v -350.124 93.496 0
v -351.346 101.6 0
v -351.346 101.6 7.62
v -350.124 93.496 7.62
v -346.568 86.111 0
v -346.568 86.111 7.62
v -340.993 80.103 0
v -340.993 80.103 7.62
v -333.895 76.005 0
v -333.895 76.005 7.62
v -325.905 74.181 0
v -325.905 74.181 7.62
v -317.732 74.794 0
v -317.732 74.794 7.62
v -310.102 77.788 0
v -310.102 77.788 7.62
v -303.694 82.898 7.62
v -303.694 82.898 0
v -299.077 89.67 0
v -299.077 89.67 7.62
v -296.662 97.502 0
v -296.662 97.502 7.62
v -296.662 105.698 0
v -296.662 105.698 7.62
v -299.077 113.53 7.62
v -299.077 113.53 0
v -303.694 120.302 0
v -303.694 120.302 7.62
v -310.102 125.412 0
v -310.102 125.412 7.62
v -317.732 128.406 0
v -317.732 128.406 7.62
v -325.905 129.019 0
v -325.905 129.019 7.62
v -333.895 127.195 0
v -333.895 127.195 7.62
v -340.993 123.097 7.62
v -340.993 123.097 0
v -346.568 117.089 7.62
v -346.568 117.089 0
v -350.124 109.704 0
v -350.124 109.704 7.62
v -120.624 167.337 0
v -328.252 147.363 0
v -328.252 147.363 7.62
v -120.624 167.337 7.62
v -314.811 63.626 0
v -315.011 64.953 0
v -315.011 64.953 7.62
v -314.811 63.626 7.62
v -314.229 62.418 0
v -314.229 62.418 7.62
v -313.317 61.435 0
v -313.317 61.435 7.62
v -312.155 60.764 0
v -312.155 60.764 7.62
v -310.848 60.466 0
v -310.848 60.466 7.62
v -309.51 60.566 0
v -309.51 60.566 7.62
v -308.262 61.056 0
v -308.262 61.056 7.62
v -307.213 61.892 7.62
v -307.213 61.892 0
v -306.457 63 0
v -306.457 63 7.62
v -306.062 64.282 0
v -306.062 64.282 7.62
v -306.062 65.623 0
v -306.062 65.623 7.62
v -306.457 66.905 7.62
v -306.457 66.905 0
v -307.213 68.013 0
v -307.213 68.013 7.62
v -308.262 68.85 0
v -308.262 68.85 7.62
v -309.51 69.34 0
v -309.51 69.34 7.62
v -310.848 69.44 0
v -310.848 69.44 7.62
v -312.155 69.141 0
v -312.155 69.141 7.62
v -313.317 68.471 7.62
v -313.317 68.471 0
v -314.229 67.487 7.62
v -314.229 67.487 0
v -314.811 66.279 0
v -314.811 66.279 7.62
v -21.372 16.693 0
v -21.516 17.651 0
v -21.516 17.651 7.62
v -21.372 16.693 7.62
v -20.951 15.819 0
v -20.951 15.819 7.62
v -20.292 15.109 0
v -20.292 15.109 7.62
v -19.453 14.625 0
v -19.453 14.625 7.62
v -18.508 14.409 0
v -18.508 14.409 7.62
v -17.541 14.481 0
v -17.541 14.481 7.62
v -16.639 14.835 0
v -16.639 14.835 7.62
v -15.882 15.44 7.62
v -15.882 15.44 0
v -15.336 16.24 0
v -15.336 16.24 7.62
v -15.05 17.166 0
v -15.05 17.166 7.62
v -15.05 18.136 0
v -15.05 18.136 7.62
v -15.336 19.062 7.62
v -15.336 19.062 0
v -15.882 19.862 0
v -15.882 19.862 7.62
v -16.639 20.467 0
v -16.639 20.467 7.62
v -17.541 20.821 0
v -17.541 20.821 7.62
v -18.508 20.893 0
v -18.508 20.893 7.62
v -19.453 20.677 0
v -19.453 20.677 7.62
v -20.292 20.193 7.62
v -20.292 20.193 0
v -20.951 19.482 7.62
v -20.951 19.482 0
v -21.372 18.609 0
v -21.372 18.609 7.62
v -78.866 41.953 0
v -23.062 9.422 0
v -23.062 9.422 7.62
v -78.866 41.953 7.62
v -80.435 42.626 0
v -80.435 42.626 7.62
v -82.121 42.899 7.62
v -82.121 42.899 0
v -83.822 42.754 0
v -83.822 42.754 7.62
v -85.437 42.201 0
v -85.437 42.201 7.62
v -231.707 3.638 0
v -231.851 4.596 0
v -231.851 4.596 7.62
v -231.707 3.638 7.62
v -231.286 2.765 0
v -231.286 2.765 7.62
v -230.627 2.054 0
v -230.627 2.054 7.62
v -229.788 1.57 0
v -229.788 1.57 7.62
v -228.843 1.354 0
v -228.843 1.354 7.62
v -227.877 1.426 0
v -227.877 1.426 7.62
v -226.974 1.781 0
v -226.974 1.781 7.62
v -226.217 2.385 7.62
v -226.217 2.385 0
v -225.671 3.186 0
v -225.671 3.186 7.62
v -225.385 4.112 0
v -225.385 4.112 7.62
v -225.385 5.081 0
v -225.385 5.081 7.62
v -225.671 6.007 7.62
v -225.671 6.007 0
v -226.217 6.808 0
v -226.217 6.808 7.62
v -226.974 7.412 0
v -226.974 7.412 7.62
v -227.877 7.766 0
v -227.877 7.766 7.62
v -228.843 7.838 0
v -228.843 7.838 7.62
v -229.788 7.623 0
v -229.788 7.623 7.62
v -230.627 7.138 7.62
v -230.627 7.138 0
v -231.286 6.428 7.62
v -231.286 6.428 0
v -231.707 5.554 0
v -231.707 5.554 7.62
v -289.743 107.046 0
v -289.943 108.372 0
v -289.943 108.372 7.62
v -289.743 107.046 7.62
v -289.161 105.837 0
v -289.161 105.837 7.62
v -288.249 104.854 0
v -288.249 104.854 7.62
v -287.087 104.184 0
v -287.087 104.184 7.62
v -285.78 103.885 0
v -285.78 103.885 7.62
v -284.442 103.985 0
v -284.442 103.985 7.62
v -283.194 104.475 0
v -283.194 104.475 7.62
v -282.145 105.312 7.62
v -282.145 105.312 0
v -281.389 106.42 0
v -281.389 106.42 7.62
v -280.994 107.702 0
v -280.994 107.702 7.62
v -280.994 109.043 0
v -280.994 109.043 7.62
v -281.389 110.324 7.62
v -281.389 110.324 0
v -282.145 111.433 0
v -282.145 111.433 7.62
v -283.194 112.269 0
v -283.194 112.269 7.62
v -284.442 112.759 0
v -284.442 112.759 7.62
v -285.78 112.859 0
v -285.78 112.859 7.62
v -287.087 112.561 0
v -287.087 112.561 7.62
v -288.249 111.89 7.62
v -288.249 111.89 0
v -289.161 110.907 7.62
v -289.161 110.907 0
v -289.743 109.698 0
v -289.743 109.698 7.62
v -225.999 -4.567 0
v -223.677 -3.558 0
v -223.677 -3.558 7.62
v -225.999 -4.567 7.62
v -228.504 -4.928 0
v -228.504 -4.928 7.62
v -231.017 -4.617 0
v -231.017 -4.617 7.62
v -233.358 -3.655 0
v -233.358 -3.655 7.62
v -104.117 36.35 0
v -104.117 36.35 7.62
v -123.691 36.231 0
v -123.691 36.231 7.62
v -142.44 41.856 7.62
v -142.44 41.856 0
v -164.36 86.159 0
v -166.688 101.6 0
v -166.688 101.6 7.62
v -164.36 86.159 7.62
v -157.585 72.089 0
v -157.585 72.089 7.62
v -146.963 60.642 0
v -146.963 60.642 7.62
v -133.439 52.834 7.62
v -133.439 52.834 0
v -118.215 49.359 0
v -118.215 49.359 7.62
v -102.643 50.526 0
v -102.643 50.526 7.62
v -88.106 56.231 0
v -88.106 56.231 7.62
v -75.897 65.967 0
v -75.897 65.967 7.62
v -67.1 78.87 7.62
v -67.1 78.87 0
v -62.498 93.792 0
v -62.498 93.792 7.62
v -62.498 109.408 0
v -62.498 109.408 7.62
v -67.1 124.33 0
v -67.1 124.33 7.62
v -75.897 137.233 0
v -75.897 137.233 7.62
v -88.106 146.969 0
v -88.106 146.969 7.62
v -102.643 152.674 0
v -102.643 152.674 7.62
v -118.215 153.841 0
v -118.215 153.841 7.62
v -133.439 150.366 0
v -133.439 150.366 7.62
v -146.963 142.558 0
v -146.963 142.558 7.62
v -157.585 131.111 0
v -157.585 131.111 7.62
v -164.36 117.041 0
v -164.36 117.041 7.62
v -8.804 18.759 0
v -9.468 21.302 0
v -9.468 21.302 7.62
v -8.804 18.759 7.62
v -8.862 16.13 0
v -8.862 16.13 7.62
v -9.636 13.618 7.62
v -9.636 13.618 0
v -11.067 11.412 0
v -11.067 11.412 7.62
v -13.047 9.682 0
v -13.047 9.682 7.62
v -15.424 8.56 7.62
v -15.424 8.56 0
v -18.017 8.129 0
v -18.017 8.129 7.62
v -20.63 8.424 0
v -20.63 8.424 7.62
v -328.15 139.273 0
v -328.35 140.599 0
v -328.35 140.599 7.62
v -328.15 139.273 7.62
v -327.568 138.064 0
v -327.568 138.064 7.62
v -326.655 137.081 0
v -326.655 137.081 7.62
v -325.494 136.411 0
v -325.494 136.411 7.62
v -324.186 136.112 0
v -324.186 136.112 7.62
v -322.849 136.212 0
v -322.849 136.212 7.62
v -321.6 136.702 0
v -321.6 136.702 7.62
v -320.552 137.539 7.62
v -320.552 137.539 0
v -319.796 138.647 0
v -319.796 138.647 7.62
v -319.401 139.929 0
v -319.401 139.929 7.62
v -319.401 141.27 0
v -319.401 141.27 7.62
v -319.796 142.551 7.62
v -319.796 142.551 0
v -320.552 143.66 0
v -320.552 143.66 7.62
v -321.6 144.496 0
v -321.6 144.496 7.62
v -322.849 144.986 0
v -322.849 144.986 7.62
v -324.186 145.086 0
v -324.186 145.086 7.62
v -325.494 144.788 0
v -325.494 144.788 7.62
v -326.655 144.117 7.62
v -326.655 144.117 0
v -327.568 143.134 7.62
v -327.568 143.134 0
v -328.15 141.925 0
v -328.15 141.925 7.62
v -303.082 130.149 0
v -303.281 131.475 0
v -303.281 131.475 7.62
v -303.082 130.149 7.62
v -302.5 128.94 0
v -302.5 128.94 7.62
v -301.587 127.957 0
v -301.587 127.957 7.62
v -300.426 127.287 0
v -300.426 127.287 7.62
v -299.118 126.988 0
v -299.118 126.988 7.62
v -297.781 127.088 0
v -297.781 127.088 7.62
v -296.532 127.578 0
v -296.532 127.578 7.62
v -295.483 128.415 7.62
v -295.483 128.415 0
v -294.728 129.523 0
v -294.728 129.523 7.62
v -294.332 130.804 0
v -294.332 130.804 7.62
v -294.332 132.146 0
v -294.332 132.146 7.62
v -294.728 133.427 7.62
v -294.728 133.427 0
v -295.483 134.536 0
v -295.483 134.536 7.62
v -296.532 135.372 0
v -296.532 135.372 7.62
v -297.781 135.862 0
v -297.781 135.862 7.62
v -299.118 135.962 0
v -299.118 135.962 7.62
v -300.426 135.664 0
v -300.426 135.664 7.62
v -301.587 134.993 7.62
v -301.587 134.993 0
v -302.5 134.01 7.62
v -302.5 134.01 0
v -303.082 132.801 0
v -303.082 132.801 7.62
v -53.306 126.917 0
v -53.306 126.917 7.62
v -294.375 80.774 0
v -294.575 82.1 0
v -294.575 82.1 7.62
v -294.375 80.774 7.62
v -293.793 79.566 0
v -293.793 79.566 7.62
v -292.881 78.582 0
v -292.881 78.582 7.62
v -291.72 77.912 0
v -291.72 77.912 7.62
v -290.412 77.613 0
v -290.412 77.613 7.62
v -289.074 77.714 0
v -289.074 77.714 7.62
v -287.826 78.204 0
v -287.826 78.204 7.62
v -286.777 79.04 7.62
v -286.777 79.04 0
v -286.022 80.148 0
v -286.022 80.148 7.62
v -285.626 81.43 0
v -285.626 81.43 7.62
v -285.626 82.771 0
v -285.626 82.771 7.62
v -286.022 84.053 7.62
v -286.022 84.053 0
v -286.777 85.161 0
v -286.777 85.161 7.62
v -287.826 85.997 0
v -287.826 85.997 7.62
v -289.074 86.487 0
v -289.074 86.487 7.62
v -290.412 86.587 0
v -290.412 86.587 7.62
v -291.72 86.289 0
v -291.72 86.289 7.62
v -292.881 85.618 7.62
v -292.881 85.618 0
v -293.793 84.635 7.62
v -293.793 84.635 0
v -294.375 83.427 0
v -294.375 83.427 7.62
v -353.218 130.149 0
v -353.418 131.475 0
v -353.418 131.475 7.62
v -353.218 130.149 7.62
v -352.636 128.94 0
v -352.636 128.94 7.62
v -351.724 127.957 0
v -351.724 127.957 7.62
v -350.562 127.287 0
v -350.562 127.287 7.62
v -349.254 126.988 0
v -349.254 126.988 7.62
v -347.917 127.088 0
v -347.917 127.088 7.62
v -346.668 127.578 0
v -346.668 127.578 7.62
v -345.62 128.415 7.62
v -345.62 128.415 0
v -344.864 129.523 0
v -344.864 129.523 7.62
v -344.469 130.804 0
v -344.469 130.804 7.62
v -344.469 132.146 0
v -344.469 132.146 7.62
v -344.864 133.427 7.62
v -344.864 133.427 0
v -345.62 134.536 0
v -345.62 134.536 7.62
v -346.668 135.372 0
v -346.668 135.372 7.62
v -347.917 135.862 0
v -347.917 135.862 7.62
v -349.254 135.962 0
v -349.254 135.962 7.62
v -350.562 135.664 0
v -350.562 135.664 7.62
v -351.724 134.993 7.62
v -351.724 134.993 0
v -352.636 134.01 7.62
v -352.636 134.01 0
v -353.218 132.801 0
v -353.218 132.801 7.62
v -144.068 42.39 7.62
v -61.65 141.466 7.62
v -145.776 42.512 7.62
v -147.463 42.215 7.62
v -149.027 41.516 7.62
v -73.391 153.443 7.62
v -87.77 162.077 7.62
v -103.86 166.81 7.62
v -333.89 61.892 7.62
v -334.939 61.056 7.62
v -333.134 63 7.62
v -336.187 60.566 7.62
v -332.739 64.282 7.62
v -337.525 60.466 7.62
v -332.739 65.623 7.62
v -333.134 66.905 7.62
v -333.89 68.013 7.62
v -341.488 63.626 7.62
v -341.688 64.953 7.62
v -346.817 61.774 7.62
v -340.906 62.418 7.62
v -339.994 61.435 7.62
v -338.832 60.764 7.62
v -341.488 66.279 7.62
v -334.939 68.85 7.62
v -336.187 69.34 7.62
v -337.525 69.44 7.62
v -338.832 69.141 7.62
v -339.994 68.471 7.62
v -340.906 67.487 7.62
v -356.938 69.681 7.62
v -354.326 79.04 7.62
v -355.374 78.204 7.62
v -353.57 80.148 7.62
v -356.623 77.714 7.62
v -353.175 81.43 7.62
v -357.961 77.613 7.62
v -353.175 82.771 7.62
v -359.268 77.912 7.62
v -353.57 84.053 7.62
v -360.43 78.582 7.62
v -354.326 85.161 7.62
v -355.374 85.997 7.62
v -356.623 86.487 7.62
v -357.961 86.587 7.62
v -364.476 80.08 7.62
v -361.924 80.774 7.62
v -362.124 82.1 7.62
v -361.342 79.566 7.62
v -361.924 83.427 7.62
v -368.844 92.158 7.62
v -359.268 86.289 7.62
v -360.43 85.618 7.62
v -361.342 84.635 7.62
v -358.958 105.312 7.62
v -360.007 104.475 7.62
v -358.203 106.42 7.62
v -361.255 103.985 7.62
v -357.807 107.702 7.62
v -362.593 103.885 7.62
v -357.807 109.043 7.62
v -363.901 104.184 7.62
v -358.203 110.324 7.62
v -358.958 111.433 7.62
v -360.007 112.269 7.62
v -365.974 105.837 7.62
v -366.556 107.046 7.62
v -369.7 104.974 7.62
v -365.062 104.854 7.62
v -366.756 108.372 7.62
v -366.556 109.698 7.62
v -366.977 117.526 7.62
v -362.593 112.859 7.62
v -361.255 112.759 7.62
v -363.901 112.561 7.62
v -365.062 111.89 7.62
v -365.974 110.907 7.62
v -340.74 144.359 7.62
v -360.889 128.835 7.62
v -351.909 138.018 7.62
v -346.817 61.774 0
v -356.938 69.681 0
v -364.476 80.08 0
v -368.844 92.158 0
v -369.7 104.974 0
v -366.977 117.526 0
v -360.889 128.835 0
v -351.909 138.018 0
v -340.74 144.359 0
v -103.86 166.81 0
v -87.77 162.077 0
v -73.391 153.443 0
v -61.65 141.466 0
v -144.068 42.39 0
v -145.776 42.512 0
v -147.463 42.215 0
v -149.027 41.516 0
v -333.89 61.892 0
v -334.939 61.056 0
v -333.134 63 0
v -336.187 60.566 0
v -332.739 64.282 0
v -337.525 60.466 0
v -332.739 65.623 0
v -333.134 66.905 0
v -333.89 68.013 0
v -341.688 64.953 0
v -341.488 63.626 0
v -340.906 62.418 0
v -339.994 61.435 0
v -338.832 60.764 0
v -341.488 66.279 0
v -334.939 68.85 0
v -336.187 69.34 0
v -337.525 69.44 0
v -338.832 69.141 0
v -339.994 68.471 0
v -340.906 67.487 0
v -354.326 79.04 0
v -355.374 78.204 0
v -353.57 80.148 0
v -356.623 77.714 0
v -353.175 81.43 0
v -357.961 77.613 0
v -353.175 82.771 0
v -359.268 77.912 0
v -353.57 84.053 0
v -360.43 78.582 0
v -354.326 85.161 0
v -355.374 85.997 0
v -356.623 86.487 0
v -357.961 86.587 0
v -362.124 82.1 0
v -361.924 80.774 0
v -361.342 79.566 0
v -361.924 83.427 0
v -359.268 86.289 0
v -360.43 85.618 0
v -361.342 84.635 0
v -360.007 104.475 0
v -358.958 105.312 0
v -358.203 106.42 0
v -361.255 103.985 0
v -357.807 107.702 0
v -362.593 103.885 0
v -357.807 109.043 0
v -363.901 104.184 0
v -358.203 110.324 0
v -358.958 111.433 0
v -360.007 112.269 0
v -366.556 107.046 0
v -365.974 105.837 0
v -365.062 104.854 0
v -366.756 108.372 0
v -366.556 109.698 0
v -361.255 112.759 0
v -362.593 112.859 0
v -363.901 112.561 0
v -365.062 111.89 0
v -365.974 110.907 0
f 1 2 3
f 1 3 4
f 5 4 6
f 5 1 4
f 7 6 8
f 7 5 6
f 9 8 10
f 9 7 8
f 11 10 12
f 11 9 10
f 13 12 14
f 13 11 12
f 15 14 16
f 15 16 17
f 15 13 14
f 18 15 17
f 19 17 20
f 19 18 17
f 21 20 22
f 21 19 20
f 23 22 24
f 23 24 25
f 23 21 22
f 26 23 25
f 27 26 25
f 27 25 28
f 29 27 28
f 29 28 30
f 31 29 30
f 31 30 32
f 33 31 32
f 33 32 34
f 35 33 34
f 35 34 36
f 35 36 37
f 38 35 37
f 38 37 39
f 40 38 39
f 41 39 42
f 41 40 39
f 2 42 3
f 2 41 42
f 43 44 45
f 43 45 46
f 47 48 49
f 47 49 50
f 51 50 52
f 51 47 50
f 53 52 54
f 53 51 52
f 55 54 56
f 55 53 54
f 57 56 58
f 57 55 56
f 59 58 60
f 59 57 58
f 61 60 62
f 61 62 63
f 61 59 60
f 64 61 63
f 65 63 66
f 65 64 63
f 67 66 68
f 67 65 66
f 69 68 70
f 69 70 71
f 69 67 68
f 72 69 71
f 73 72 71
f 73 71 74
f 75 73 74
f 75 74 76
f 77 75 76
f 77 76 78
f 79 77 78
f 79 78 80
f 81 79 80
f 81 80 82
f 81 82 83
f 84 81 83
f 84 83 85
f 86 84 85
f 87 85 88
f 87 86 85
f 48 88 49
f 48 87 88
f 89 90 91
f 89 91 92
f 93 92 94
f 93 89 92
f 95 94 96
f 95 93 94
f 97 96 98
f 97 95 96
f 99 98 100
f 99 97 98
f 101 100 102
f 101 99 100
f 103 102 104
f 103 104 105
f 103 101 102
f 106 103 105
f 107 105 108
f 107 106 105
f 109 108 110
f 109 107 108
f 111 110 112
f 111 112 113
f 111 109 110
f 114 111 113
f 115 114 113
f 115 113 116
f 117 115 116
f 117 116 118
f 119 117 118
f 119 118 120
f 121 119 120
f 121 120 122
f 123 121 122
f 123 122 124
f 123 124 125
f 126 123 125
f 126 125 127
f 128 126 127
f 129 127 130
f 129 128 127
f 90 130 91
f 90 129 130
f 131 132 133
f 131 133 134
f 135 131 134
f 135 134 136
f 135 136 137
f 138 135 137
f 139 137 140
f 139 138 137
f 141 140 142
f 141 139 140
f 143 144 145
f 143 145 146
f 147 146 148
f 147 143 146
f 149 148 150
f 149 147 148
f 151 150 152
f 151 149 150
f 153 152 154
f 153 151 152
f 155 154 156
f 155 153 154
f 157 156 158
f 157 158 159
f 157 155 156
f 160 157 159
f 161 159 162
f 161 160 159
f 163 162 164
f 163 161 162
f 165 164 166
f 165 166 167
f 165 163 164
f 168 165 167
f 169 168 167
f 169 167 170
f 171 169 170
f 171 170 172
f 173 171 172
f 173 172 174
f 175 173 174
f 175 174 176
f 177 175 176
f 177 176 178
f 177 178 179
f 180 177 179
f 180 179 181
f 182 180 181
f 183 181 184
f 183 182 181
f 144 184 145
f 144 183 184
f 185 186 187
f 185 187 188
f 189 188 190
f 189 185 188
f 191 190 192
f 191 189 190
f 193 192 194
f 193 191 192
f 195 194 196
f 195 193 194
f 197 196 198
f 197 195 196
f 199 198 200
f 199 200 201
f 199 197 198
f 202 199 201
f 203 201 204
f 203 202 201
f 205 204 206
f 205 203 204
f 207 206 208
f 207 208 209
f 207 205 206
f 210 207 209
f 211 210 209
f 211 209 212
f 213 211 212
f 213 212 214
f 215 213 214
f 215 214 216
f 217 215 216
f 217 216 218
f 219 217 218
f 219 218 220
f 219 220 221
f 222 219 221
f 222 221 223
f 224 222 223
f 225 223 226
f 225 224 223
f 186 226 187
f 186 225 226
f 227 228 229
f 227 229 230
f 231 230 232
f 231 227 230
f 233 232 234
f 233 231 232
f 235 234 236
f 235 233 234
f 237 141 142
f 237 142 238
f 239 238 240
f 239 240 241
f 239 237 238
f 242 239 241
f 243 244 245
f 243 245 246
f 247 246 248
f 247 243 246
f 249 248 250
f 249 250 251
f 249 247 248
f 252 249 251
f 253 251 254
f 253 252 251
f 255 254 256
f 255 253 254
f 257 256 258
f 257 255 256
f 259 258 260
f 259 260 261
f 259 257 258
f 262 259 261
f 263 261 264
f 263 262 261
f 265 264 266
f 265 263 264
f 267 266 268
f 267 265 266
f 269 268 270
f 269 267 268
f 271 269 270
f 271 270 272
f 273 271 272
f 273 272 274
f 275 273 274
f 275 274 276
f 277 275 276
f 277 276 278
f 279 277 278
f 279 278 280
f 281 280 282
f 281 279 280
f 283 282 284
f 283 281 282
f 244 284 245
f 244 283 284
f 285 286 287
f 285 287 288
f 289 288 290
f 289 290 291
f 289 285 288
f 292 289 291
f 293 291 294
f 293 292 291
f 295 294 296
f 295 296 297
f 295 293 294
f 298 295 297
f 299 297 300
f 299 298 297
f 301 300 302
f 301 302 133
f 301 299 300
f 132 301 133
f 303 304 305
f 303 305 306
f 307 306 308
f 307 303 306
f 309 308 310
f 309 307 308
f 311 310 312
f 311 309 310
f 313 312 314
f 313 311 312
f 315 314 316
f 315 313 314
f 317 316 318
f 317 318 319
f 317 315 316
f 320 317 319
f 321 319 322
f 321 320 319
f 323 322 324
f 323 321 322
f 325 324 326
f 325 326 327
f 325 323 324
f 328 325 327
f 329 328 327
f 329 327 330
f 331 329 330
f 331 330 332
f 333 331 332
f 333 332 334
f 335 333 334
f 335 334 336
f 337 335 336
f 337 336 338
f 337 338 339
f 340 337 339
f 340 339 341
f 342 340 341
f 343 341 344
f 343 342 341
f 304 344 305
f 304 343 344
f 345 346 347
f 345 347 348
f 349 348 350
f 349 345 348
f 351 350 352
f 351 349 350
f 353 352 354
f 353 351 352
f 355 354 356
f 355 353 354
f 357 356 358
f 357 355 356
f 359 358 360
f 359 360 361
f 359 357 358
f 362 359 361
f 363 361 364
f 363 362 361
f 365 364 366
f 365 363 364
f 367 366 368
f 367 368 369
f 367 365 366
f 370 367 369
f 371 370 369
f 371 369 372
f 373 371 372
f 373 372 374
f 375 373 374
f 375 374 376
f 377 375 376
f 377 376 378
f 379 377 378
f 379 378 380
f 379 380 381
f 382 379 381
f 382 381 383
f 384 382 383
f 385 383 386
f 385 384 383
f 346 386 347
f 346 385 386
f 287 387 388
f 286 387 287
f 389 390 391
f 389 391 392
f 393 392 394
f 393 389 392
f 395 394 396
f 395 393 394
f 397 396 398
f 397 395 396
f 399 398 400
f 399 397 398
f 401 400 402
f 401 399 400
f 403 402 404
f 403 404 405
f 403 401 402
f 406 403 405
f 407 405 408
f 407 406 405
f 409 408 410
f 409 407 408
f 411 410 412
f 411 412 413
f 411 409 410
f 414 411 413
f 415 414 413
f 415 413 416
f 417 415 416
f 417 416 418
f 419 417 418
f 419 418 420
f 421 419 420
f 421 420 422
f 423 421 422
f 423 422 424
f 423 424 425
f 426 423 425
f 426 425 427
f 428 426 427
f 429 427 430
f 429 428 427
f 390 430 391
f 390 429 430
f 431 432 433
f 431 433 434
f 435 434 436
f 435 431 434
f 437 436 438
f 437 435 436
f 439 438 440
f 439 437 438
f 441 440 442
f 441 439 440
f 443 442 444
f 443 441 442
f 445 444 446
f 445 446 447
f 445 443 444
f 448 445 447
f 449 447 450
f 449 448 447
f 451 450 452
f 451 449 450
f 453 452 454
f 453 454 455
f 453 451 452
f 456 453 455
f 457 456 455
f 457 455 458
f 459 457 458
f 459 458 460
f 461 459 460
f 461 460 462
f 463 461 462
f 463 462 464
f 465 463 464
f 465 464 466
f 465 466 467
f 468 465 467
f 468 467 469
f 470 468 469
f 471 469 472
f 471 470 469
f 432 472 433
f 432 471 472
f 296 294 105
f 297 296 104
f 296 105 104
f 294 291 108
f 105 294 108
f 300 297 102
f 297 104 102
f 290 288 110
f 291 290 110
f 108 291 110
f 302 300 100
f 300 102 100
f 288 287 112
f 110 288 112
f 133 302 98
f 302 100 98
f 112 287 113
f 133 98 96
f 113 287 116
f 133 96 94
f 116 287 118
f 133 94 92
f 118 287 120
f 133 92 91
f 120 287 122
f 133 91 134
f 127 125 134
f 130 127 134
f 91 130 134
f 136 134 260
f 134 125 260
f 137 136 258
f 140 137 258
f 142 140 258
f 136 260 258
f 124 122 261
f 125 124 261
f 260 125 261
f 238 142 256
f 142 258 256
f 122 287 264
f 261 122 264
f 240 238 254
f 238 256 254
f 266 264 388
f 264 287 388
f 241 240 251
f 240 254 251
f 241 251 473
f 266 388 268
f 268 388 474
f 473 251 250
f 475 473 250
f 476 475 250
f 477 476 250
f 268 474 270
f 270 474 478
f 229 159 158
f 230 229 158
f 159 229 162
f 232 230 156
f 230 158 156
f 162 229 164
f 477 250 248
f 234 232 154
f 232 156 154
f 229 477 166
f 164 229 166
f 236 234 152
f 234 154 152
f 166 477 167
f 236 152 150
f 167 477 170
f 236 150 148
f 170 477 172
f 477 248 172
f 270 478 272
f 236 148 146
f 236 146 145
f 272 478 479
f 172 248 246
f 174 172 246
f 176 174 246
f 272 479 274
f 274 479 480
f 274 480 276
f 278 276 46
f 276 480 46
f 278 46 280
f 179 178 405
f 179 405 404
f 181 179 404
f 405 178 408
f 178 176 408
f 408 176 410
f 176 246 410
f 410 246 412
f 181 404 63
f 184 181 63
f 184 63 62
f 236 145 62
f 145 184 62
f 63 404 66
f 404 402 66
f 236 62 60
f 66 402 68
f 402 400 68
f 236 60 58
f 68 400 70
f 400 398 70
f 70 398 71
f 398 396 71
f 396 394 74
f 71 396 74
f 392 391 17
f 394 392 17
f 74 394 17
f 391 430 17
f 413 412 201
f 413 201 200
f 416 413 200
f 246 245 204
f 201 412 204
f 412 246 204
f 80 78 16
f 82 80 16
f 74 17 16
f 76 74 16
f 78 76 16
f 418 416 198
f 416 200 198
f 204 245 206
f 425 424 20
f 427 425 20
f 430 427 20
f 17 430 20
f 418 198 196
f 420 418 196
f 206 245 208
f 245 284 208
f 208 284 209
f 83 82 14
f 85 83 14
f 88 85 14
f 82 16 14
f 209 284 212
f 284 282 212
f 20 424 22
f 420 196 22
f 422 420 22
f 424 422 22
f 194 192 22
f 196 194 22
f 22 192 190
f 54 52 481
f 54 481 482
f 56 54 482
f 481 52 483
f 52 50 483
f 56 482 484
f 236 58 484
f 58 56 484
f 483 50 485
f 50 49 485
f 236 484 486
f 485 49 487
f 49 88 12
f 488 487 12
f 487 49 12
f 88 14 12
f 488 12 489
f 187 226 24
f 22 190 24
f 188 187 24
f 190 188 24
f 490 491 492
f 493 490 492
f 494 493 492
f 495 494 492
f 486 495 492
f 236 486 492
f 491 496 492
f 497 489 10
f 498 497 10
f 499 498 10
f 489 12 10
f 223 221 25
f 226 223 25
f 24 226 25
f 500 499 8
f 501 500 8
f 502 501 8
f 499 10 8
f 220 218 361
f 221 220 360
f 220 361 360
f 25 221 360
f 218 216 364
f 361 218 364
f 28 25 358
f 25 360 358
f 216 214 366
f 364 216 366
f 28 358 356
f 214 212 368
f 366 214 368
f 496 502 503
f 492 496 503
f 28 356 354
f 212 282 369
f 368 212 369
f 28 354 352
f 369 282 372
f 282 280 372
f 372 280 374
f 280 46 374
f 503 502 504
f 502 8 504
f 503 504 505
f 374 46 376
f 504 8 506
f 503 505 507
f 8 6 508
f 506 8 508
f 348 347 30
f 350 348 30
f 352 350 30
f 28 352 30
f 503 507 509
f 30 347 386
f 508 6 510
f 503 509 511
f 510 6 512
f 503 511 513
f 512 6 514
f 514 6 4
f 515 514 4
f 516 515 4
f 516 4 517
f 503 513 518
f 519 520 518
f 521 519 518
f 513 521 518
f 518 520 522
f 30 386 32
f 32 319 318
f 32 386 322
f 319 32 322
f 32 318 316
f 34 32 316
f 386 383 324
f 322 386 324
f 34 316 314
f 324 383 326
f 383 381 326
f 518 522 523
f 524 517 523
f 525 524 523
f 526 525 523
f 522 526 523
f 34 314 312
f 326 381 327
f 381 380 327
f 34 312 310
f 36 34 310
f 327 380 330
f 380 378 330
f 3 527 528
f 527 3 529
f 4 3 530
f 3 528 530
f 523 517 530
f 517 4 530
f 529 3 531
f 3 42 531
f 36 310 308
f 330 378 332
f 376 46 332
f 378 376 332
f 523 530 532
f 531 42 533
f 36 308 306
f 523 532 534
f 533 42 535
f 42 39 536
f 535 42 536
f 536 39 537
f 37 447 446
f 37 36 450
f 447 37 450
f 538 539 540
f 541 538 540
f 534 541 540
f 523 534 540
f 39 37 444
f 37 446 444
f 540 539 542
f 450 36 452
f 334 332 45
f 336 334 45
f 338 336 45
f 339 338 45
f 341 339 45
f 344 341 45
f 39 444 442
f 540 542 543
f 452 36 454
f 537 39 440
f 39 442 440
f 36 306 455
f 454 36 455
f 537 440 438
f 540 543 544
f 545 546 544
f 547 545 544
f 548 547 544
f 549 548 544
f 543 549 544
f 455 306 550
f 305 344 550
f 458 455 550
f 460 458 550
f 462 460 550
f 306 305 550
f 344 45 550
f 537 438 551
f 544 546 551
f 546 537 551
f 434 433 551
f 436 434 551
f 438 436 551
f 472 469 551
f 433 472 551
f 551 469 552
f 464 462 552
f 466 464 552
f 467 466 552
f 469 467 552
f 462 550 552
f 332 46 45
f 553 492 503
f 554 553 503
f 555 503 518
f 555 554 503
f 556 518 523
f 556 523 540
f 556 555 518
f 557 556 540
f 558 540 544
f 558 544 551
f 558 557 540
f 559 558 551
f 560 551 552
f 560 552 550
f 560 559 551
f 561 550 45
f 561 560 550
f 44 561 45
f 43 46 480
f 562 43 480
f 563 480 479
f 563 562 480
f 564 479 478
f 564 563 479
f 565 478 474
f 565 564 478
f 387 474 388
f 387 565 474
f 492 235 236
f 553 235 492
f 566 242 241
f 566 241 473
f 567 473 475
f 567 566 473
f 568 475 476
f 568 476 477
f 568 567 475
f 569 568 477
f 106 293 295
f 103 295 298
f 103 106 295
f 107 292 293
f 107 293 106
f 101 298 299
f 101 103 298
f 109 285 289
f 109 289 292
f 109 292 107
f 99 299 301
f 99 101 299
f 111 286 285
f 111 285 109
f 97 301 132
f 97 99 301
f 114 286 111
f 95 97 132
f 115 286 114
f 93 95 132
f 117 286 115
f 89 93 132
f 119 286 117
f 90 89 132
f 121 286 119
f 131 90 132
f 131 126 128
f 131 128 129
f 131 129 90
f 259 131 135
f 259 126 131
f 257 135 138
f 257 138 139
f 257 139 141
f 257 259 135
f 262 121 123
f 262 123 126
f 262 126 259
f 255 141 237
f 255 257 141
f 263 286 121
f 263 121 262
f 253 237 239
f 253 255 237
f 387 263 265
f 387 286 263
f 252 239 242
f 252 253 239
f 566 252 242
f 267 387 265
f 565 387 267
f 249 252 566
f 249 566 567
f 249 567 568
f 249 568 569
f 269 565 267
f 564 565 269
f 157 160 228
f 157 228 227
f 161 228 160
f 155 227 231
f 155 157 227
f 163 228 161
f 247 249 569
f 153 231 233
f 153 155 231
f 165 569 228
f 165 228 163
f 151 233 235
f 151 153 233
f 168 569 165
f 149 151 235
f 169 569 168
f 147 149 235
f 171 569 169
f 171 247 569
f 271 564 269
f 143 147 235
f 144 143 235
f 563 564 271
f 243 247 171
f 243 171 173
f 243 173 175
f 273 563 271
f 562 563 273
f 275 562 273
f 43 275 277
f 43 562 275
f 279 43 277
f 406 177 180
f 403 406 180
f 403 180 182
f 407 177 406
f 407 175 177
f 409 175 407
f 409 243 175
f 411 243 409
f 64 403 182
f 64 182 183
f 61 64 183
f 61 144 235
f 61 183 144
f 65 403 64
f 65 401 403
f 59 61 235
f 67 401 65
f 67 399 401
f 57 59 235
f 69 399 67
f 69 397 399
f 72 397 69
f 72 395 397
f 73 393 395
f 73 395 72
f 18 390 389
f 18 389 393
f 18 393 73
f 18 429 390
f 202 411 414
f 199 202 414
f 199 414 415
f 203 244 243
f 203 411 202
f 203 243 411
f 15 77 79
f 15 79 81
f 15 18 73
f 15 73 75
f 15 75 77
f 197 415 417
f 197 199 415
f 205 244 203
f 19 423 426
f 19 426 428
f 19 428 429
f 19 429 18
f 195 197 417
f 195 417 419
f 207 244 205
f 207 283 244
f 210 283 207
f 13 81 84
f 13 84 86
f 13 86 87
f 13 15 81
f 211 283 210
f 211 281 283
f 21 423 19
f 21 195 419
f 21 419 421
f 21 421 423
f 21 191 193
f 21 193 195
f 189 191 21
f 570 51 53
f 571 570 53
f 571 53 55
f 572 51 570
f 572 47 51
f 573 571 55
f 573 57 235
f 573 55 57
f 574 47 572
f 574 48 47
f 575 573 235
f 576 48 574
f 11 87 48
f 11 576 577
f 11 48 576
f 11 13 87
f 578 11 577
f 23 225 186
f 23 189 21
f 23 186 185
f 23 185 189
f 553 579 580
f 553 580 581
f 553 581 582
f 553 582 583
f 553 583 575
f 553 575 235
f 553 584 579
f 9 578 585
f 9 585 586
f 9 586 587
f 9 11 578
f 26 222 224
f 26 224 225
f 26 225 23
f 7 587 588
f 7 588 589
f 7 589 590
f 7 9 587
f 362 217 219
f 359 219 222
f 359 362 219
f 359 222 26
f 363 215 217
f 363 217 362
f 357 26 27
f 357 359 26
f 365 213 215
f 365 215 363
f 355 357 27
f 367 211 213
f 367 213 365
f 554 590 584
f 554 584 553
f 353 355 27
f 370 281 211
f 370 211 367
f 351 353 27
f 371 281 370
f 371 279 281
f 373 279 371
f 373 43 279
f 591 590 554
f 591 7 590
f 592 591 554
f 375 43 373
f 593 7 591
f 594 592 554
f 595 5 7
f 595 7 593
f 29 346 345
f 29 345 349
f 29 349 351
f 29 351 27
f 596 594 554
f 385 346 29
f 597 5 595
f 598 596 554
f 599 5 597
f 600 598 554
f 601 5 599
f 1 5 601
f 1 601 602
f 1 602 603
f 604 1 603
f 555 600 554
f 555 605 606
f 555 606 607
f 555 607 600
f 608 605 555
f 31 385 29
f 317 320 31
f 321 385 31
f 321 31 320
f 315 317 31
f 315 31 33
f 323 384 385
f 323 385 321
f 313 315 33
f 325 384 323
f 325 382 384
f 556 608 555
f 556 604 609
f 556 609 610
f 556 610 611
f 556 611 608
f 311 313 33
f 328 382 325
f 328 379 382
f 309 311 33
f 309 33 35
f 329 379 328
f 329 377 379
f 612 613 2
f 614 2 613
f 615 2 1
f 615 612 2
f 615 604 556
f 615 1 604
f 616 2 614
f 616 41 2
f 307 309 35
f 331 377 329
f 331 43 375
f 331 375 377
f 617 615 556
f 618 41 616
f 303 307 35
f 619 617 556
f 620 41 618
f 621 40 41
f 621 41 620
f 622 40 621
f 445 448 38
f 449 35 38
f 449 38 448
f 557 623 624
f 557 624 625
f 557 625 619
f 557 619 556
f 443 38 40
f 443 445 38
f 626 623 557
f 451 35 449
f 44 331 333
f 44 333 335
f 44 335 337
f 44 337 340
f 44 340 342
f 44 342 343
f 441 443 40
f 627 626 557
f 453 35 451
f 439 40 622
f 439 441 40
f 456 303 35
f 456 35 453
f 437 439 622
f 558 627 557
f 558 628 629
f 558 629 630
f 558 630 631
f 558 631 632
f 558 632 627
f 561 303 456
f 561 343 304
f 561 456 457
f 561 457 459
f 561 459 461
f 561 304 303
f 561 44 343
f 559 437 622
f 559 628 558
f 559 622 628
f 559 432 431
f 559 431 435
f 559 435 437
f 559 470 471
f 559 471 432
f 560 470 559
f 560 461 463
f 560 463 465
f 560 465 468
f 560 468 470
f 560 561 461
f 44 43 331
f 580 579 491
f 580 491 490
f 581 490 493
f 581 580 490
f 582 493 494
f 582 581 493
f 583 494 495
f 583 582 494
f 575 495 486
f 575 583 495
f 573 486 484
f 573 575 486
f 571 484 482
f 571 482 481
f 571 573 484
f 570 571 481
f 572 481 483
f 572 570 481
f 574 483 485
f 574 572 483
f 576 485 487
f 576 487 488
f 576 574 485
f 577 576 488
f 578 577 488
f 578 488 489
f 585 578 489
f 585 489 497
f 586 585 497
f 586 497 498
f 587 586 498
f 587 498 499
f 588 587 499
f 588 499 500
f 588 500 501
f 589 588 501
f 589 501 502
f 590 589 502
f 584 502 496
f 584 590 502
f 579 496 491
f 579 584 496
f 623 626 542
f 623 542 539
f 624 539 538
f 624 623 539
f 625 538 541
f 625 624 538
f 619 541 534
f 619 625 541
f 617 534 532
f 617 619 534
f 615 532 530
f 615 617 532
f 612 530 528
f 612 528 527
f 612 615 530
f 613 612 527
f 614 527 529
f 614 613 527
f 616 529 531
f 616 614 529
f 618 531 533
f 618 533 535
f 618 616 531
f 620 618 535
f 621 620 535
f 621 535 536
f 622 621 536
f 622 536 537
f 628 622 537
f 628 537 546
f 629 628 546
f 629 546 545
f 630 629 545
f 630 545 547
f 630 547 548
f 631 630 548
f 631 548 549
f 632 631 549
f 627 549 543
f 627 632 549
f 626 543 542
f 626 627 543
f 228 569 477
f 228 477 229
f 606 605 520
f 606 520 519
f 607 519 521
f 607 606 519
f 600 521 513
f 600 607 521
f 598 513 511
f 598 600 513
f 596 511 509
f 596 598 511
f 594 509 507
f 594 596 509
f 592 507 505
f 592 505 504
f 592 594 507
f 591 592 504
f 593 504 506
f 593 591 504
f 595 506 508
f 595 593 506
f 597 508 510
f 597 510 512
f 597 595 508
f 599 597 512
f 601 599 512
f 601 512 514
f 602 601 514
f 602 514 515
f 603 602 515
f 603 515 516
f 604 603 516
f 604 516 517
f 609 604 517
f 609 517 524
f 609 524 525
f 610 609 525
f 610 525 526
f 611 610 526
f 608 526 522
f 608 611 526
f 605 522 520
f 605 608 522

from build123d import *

# Parameters (mm, degrees)
SKETCH1_R           = 27.4955
SKETCH1_R_2         = 52.3875
SKETCH1_R_3         = 3.2512
SKETCH1_R_4         = 4.49961
BOSS_EXTRUDE1_DEPTH = 7.62


with BuildPart() as part:
    # Sketch1 → Boss-Extrude1 (new body)
    with BuildSketch(Plane.XY):
        with BuildLine():
            Line((-328.252358788, 147.362734983), (-120.623830303, 167.33652539))
            ThreePointArc((-120.623830303, 167.33652539), (-80.305183306, 158.218318925), (-53.30558743, 126.917251733))
            Line((-53.30558743, 126.917251733), (-9.46754648, 21.302488163))
            ThreePointArc((-9.46754648, 21.302488163), (-11.996916286, 10.47886003), (-23.061809086, 9.422079593))
            Line((-23.061809086, 9.422079593), (-78.866488962, 41.953179506))
            ThreePointArc((-78.866488962, 41.953179506), (-82.120777387, 42.89869406), (-85.437090509, 42.2012285))
            ThreePointArc((-85.437090509, 42.2012285), (-113.899521097, 35.561214301), (-142.440389403, 41.855543485))
            ThreePointArc((-142.440389403, 41.855543485), (-145.776424621, 42.51215325), (-149.027245523, 41.515945031))
            Line((-149.027245523, 41.515945031), (-223.676633484, -3.557736497))
            ThreePointArc((-223.676633484, -3.557736497), (-228.504182895, -4.928354428), (-233.358329437, -3.655134819))
            Line((-233.358329437, -3.655134819), (-346.816870084, 61.773732857))
            ThreePointArc((-346.816870084, 61.773732857), (-368.77925543, 111.345290274), (-328.252358788, 147.362734983))
        make_face()
        with Locations(Location((-323.85, 101.6, 0), (0, 0, 180))):
            Circle(SKETCH1_R, mode=Mode.SUBTRACT)
        with Locations(Location((-114.3, 101.6, 0), (0, 0, 180))):
            Circle(SKETCH1_R_2, mode=Mode.SUBTRACT)
        with Locations(Location((-228.6, 4.596163622, 0), (0, 0, 180))):
            Circle(SKETCH1_R_3, mode=Mode.SUBTRACT)
        with Locations(Location((-18.264817524, 17.65096147, 0), (0, 0, 180))):
            Circle(SKETCH1_R_3, mode=Mode.SUBTRACT)
        with Locations(Location((-323.85, 140.59916, 0), (0, 0, 180))):
            Circle(SKETCH1_R_4, mode=Mode.SUBTRACT)
        with Locations(Location((-298.781823164, 131.475089804, 0), (0, 0, 180))):
            Circle(SKETCH1_R_4, mode=Mode.SUBTRACT)
        with Locations(Location((-285.443324871, 108.372133065, 0), (0, 0, 180))):
            Circle(SKETCH1_R_4, mode=Mode.SUBTRACT)
        with Locations(Location((-290.075736714, 82.10042, 0), (0, 0, 180))):
            Circle(SKETCH1_R_4, mode=Mode.SUBTRACT)
        with Locations(Location((-310.511501707, 64.952777131, 0), (0, 0, 180))):
            Circle(SKETCH1_R_4, mode=Mode.SUBTRACT)
        with Locations(Location((-337.188498293, 64.952777131, 0), (0, 0, 180))):
            Circle(SKETCH1_R_4, mode=Mode.SUBTRACT)
        with Locations(Location((-357.624263286, 82.10042, 0), (0, 0, 180))):
            Circle(SKETCH1_R_4, mode=Mode.SUBTRACT)
        with Locations(Location((-362.256675129, 108.372133065, 0), (0, 0, 180))):
            Circle(SKETCH1_R_4, mode=Mode.SUBTRACT)
        with Locations(Location((-348.918176836, 131.475089804, 0), (0, 0, 180))):
            Circle(SKETCH1_R_4, mode=Mode.SUBTRACT)
    extrude(amount=BOSS_EXTRUDE1_DEPTH)


solid = part.part
